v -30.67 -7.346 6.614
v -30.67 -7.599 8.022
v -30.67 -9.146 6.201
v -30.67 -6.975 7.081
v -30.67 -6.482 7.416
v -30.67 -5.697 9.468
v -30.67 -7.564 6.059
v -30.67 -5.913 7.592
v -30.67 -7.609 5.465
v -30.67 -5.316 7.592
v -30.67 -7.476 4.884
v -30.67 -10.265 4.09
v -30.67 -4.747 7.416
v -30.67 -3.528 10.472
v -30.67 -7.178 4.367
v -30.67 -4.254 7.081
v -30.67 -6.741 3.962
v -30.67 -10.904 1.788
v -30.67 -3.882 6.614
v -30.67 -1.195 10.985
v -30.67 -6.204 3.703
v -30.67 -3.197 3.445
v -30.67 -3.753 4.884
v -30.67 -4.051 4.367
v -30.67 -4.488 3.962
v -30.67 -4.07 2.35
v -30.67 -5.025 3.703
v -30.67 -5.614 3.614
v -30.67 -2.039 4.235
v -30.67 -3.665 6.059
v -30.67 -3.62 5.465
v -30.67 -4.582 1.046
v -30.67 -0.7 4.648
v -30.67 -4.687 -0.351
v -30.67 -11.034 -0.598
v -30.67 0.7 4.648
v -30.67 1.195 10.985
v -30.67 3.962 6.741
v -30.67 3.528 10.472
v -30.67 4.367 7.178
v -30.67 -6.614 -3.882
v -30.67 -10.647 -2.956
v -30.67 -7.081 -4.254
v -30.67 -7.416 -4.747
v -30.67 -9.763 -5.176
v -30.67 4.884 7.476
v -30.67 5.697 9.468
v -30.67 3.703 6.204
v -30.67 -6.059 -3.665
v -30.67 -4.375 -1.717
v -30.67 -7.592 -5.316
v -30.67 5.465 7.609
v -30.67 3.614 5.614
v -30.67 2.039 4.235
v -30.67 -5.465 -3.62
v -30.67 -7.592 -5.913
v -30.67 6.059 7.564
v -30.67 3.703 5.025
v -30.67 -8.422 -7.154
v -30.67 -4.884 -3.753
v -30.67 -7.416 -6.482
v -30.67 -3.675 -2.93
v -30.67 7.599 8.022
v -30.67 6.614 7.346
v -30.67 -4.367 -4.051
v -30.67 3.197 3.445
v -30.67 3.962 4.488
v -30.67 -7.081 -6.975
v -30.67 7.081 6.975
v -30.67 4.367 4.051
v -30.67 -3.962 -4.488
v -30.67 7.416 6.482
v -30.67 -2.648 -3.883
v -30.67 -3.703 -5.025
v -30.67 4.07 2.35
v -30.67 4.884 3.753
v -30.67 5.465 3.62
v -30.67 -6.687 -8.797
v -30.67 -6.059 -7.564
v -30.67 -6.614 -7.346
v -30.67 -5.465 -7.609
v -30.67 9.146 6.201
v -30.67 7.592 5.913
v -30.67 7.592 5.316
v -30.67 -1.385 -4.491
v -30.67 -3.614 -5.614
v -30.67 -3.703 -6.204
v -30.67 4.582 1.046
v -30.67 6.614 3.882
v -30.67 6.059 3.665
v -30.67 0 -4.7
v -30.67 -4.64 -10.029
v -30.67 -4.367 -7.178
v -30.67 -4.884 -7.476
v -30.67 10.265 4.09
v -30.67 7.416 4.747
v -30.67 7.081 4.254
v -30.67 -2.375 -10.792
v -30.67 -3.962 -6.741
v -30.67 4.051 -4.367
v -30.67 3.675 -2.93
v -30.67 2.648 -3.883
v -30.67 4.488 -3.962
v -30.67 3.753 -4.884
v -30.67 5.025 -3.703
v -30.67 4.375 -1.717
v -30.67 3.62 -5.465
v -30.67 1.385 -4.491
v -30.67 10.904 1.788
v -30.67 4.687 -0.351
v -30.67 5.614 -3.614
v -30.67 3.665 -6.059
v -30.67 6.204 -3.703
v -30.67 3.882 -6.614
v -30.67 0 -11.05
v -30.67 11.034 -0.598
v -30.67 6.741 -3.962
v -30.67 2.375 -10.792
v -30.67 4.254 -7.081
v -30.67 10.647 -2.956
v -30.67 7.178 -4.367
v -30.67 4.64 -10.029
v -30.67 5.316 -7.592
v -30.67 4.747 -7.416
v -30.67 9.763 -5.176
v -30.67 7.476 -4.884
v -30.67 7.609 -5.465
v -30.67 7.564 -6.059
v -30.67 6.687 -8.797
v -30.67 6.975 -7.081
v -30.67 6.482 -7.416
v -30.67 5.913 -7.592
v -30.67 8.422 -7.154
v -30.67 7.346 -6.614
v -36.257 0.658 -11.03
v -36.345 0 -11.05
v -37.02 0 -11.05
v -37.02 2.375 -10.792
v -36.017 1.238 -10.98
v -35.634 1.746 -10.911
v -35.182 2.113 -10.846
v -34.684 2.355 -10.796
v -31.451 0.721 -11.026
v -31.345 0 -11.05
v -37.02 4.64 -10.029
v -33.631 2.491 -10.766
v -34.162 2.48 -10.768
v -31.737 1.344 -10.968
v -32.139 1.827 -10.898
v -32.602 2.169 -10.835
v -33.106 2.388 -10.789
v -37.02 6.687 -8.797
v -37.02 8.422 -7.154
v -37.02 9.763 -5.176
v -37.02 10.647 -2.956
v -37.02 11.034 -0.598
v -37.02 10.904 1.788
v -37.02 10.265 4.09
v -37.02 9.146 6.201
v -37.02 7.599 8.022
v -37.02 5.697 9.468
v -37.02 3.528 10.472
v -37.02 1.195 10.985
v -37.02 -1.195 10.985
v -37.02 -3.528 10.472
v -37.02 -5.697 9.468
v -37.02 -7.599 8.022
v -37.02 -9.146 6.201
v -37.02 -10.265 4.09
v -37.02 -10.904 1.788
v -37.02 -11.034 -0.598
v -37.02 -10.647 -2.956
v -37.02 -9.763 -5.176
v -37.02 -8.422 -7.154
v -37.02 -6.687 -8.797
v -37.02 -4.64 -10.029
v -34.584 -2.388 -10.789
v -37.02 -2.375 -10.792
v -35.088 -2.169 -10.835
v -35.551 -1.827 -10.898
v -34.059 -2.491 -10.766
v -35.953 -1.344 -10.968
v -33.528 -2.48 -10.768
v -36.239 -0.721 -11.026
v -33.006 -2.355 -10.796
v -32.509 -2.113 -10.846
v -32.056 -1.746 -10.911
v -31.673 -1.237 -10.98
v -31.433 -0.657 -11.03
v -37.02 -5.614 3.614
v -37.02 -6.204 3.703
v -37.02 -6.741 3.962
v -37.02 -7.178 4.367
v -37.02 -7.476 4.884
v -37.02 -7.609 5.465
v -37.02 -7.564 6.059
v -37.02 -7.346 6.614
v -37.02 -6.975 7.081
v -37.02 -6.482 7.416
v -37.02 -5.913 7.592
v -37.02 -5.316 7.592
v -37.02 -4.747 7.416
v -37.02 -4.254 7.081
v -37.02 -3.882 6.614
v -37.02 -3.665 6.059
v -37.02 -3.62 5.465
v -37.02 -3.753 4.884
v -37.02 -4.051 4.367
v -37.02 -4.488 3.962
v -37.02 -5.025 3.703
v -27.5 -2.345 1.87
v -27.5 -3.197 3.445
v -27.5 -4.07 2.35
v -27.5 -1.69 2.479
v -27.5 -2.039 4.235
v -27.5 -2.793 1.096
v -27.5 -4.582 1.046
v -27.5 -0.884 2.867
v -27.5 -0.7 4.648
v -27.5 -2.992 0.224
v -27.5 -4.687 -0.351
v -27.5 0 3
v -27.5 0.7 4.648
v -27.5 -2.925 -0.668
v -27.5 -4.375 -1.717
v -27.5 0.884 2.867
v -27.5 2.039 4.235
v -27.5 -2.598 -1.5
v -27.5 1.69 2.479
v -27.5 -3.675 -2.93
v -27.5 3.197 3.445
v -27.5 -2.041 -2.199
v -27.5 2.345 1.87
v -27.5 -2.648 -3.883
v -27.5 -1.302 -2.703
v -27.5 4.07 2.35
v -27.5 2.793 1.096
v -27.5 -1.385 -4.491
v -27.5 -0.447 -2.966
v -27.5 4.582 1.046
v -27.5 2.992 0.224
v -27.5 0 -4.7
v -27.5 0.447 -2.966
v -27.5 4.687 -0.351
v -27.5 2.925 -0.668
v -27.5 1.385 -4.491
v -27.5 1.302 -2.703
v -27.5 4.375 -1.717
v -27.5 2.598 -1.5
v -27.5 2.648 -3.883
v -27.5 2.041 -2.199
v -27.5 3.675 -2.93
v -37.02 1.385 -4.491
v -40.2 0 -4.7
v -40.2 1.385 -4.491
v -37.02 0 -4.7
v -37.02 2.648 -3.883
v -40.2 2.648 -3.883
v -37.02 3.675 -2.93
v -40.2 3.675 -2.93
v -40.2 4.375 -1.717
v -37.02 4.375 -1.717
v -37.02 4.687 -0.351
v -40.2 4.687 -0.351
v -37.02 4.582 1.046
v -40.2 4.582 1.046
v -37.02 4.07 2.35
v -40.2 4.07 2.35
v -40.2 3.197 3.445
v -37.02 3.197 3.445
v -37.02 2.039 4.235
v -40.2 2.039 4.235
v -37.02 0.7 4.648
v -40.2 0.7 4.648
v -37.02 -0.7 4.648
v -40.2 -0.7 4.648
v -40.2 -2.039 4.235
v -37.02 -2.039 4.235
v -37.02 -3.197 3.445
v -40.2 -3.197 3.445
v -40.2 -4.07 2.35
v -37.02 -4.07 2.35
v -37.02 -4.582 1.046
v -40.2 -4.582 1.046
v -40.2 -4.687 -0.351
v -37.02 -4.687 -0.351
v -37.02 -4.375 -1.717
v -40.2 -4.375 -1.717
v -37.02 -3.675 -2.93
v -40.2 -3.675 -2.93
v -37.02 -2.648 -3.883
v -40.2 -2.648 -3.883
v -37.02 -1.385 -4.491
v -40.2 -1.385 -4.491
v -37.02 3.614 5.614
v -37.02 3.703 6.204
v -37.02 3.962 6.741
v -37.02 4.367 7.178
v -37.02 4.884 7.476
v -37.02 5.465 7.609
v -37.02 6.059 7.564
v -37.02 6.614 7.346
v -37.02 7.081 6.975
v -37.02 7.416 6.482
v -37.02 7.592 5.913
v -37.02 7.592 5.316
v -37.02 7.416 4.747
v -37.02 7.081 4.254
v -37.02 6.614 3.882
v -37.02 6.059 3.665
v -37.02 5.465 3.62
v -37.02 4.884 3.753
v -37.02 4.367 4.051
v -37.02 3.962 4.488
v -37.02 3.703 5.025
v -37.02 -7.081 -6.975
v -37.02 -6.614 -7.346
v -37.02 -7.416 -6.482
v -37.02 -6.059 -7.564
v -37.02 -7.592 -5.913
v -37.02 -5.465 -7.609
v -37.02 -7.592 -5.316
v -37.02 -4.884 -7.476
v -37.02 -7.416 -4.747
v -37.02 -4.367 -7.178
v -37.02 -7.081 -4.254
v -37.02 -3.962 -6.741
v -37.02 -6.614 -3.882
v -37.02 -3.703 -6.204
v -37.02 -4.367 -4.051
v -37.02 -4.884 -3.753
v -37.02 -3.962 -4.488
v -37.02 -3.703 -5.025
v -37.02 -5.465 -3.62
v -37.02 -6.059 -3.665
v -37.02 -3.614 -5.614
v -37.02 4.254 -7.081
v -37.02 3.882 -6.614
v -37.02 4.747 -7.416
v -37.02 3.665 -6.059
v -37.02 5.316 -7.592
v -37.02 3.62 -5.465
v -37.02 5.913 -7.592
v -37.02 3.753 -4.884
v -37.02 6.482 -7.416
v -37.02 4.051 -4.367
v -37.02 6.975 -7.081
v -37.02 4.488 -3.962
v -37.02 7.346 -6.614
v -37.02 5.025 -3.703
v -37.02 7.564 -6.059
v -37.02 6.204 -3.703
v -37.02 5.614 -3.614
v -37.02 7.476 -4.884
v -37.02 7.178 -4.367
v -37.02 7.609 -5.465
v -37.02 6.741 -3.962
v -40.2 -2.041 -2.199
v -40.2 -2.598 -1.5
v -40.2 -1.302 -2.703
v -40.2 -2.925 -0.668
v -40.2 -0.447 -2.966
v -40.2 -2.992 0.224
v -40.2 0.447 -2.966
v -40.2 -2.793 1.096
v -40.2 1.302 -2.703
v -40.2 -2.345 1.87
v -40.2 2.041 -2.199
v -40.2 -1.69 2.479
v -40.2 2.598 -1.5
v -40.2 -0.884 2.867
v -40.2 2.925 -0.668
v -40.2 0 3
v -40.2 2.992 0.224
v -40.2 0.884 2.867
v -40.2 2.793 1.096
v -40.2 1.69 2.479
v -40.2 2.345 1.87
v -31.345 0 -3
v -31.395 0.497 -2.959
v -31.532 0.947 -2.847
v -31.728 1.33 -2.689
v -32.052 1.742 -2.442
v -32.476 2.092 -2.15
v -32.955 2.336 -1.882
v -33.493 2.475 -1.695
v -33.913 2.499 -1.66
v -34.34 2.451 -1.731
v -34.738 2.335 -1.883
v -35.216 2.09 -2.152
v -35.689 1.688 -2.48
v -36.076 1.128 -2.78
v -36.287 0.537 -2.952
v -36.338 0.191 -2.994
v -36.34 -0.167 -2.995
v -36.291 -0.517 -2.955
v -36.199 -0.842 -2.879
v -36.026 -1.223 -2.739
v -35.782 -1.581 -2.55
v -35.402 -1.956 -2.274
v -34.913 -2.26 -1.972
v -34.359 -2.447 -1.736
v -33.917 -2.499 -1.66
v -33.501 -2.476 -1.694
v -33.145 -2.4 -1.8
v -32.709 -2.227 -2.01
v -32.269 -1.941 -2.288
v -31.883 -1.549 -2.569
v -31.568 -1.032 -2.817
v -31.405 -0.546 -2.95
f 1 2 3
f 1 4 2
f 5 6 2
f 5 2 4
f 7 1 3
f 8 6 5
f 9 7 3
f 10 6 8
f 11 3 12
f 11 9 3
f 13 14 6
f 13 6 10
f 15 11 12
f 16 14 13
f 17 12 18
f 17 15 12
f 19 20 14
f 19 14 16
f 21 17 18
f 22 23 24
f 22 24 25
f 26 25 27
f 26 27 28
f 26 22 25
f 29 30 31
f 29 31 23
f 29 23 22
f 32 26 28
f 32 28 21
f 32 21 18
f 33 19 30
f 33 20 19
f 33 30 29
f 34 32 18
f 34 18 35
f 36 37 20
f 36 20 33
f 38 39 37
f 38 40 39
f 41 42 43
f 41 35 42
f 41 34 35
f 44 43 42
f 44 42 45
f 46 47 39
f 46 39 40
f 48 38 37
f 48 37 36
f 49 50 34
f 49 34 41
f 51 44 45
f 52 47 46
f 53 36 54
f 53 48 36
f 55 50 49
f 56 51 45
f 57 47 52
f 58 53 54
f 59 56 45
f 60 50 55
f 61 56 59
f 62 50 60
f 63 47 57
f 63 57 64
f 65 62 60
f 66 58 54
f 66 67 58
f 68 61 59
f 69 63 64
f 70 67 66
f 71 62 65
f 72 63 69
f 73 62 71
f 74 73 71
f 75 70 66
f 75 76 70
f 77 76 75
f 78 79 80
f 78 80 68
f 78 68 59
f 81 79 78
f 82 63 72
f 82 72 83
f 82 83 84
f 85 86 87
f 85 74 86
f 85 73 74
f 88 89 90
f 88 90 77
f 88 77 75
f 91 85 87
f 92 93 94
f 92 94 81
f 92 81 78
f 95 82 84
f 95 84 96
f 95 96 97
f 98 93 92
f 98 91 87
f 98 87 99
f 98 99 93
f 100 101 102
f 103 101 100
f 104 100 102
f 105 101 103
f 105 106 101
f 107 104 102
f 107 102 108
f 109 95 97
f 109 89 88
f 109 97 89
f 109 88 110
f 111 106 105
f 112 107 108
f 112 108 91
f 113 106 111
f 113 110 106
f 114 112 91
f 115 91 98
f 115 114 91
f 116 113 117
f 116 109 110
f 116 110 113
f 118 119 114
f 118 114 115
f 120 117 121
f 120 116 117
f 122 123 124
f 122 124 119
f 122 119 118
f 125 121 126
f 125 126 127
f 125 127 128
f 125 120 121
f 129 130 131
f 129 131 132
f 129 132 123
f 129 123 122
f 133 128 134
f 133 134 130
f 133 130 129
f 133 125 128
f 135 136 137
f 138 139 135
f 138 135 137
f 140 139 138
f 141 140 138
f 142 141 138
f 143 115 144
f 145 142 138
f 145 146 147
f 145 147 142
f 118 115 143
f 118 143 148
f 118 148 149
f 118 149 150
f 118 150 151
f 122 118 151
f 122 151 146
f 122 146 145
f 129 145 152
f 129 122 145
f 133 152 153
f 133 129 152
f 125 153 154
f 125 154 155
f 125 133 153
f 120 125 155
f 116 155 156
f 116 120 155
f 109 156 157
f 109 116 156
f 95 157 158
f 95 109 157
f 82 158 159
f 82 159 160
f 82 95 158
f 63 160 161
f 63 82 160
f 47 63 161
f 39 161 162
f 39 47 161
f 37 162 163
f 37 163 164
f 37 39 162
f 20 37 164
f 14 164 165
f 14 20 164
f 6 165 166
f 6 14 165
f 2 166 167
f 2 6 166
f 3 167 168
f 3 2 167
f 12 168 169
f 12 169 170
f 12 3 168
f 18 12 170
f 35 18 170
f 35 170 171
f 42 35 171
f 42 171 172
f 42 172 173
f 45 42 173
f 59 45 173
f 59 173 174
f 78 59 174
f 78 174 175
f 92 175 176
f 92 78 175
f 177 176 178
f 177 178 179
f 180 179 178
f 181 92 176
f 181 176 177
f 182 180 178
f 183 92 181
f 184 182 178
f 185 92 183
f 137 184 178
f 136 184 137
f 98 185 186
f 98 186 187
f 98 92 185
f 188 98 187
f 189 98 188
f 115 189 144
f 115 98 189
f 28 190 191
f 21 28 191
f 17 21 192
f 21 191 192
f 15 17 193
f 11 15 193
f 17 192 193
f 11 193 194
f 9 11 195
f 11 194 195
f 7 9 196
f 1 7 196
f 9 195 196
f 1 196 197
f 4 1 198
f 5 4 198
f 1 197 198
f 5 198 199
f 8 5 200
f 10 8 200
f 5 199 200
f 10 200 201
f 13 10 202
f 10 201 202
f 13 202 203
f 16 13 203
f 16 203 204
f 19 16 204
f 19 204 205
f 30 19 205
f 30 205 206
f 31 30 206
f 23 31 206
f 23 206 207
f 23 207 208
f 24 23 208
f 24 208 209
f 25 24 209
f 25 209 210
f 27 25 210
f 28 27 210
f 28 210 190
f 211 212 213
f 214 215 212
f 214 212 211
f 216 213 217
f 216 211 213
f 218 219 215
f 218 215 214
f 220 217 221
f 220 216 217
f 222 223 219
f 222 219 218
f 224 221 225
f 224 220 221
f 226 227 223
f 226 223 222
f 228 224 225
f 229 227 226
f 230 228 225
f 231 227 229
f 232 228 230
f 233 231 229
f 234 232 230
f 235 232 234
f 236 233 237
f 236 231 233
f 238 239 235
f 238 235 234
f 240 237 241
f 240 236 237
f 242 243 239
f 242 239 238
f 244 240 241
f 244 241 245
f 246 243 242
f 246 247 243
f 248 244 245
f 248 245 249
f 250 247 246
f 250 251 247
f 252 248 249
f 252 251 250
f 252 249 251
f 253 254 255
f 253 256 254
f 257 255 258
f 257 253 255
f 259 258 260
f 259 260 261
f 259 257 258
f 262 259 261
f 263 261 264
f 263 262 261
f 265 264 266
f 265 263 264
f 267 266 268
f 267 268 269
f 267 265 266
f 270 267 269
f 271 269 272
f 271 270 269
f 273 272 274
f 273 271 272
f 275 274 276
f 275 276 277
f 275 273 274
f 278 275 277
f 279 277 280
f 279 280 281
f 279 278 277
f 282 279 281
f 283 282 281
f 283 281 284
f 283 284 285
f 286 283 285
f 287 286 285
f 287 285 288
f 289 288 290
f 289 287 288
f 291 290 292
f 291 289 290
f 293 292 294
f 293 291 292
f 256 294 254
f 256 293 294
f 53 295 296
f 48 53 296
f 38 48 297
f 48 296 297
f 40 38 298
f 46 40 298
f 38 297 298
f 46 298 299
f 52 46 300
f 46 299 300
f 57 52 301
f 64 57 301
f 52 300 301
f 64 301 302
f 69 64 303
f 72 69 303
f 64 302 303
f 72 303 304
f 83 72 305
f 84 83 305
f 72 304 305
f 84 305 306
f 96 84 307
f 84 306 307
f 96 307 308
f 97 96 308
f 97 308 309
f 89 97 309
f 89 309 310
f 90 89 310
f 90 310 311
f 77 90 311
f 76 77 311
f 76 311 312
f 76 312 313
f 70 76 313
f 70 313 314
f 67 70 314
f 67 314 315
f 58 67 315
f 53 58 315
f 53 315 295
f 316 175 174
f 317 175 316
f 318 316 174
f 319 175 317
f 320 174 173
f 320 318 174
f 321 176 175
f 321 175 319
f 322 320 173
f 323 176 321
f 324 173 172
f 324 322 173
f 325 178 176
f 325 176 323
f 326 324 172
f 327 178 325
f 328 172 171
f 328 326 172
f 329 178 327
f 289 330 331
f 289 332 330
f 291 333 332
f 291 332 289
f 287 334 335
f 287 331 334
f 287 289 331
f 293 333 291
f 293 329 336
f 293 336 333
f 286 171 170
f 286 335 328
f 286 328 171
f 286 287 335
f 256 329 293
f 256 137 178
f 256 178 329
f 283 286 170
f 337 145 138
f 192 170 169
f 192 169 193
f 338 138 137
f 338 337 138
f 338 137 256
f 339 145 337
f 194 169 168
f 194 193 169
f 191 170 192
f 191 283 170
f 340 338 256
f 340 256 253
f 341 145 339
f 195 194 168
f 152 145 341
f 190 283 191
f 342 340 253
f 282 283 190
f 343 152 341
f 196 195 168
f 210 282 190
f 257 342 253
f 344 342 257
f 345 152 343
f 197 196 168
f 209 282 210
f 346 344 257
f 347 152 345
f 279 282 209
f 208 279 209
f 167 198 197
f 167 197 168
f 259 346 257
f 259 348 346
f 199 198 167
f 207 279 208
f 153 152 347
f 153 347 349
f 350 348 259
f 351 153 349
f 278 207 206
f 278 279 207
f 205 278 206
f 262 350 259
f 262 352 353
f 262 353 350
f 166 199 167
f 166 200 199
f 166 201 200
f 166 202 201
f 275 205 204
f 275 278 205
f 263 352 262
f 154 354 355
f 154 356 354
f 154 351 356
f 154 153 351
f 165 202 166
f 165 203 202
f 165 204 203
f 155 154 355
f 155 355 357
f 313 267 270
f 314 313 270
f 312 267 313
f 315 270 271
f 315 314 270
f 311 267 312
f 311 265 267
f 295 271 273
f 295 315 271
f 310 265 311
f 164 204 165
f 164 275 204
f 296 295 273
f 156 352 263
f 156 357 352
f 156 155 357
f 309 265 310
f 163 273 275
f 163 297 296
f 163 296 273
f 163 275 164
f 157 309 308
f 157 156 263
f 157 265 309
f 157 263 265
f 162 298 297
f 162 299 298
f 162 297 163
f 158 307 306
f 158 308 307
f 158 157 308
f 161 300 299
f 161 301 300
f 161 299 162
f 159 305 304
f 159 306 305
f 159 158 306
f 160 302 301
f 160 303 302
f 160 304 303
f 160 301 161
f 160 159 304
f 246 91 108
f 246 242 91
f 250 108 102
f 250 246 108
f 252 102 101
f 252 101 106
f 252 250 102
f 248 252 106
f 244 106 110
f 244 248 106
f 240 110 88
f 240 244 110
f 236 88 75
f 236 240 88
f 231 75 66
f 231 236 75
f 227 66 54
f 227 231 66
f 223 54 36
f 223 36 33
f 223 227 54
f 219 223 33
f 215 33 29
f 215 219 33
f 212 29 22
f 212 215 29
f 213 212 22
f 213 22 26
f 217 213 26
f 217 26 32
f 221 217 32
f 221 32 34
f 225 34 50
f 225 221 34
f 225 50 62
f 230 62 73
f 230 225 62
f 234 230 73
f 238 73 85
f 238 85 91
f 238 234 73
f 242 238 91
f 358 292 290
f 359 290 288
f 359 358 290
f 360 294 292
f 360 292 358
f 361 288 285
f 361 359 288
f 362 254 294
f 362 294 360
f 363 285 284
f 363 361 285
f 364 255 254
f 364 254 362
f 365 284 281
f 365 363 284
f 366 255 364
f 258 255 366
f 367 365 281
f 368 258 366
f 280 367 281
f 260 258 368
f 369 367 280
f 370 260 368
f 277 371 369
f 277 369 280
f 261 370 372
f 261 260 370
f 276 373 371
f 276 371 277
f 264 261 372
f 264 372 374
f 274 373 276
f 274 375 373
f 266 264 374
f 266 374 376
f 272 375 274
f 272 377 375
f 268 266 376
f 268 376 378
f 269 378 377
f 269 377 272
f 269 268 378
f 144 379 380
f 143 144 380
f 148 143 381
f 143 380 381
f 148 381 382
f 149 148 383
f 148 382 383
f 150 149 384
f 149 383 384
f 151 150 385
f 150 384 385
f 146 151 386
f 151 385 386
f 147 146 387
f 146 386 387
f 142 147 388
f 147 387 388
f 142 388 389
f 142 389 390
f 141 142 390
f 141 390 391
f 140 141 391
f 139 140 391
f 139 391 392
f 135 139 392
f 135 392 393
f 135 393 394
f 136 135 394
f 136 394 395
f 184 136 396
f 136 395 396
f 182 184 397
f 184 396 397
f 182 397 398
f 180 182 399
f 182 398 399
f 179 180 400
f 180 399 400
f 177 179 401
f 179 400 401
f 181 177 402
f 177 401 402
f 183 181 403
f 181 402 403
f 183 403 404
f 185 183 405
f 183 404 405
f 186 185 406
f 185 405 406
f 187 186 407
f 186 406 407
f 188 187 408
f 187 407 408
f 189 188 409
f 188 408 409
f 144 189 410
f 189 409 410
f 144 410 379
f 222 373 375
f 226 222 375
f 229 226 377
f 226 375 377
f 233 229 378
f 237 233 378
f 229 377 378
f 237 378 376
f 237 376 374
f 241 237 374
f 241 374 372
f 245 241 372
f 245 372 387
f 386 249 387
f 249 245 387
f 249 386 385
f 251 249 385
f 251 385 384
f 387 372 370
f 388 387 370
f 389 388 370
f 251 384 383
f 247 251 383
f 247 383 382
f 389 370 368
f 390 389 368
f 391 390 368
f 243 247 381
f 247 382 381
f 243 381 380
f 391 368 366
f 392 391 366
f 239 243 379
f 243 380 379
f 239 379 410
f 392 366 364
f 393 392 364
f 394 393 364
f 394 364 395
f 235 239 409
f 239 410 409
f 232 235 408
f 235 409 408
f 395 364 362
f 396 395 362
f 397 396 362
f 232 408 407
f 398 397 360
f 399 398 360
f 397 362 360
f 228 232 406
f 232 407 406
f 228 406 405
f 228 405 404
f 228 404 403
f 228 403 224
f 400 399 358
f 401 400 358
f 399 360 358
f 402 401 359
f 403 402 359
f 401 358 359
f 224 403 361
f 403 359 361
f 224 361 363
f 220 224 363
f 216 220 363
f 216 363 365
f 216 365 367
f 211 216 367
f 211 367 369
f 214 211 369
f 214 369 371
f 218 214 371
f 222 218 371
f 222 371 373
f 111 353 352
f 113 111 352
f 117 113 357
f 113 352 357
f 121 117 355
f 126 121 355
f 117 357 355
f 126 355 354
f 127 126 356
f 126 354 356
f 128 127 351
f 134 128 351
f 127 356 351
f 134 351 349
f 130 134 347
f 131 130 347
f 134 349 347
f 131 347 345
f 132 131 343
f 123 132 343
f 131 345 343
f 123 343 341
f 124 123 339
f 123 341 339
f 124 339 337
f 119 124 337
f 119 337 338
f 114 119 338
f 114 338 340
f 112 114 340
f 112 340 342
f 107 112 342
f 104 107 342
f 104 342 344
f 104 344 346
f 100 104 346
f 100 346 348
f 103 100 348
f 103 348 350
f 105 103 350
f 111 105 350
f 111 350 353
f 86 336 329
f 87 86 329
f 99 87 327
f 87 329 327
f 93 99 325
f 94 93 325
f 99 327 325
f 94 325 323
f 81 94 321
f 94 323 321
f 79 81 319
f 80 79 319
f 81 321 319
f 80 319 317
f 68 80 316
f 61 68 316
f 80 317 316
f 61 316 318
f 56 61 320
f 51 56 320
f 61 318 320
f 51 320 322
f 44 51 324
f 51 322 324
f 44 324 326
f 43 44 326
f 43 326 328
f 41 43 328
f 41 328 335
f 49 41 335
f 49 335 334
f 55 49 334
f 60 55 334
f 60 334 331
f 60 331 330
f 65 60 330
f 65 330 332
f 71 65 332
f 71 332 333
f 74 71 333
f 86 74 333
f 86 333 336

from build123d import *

# Parameters (mm, degrees)
ESQUISSE2_R                  = 3
ENL_V_MAT_EXTRU_1_DEPTH      = 13.7
ESQUISSE3_R                  = 2
ENL_V_MAT_EXTRU_2_DEPTH      = 10
R_P_TITION_CIRCULAIRE1_COUNT = 4
ESQUISSE5_R                  = 2.5
ENL_V_MAT_EXTRU_3_DEPTH      = 12.05


with BuildPart() as part:
    # Esquisse1 → Révolution1 (revolve)
    with BuildSketch(Plane(origin=(0, 0, 0), x_dir=(1, 0, 0), z_dir=(0, 1, 0))):
        Polygon((-40.200130208, 0), (-40.200130208, 4.7), (-37.020130208, 4.7), (-37.020130208, 11.05), (-30.670130208, 11.05), (-30.670130208, 4.7), (-27.500130208, 4.7), (-27.500130208, 0), align=None)
    revolve(axis=Axis((-53.297005208, 0, 0), (1, 0, 0)))

    # Esquisse2 → Enlèv. mat.-Extru.1 (cut, through all)
    with BuildSketch(Plane.ZY.offset(40.200130208)):
        Circle(ESQUISSE2_R)
    extrude(amount=-ENL_V_MAT_EXTRU_1_DEPTH, mode=Mode.SUBTRACT)

    # Esquisse3 → Enlèv. mat.-Extru.2 (cut)
    with BuildSketch(Plane.ZY.offset(37.020130208)):
        with Locations((-5.614427843, 5.614427843)):
            Circle(ESQUISSE3_R)
    enl_v_mat_extru_2 = extrude(amount=-ENL_V_MAT_EXTRU_2_DEPTH, mode=Mode.SUBTRACT)

    # Répétition circulaire1: Enlèv. mat.-Extru.2 ×4 about axis
    r_p_tition_circulaire1_axis = Axis((0, 0, 0), (1, 0, 0))
    for i in range(1, R_P_TITION_CIRCULAIRE1_COUNT):
        add(enl_v_mat_extru_2.rotate(r_p_tition_circulaire1_axis, i * 360 / R_P_TITION_CIRCULAIRE1_COUNT), mode=Mode.SUBTRACT)

    # Esquisse5 → Enlèv. mat.-Extru.3 (cut, through all)
    with BuildSketch(Plane.XY):
        with Locations((-33.845130208, 0)):
            Circle(ESQUISSE5_R)
    extrude(amount=-ENL_V_MAT_EXTRU_3_DEPTH, mode=Mode.SUBTRACT)


solid = part.part
